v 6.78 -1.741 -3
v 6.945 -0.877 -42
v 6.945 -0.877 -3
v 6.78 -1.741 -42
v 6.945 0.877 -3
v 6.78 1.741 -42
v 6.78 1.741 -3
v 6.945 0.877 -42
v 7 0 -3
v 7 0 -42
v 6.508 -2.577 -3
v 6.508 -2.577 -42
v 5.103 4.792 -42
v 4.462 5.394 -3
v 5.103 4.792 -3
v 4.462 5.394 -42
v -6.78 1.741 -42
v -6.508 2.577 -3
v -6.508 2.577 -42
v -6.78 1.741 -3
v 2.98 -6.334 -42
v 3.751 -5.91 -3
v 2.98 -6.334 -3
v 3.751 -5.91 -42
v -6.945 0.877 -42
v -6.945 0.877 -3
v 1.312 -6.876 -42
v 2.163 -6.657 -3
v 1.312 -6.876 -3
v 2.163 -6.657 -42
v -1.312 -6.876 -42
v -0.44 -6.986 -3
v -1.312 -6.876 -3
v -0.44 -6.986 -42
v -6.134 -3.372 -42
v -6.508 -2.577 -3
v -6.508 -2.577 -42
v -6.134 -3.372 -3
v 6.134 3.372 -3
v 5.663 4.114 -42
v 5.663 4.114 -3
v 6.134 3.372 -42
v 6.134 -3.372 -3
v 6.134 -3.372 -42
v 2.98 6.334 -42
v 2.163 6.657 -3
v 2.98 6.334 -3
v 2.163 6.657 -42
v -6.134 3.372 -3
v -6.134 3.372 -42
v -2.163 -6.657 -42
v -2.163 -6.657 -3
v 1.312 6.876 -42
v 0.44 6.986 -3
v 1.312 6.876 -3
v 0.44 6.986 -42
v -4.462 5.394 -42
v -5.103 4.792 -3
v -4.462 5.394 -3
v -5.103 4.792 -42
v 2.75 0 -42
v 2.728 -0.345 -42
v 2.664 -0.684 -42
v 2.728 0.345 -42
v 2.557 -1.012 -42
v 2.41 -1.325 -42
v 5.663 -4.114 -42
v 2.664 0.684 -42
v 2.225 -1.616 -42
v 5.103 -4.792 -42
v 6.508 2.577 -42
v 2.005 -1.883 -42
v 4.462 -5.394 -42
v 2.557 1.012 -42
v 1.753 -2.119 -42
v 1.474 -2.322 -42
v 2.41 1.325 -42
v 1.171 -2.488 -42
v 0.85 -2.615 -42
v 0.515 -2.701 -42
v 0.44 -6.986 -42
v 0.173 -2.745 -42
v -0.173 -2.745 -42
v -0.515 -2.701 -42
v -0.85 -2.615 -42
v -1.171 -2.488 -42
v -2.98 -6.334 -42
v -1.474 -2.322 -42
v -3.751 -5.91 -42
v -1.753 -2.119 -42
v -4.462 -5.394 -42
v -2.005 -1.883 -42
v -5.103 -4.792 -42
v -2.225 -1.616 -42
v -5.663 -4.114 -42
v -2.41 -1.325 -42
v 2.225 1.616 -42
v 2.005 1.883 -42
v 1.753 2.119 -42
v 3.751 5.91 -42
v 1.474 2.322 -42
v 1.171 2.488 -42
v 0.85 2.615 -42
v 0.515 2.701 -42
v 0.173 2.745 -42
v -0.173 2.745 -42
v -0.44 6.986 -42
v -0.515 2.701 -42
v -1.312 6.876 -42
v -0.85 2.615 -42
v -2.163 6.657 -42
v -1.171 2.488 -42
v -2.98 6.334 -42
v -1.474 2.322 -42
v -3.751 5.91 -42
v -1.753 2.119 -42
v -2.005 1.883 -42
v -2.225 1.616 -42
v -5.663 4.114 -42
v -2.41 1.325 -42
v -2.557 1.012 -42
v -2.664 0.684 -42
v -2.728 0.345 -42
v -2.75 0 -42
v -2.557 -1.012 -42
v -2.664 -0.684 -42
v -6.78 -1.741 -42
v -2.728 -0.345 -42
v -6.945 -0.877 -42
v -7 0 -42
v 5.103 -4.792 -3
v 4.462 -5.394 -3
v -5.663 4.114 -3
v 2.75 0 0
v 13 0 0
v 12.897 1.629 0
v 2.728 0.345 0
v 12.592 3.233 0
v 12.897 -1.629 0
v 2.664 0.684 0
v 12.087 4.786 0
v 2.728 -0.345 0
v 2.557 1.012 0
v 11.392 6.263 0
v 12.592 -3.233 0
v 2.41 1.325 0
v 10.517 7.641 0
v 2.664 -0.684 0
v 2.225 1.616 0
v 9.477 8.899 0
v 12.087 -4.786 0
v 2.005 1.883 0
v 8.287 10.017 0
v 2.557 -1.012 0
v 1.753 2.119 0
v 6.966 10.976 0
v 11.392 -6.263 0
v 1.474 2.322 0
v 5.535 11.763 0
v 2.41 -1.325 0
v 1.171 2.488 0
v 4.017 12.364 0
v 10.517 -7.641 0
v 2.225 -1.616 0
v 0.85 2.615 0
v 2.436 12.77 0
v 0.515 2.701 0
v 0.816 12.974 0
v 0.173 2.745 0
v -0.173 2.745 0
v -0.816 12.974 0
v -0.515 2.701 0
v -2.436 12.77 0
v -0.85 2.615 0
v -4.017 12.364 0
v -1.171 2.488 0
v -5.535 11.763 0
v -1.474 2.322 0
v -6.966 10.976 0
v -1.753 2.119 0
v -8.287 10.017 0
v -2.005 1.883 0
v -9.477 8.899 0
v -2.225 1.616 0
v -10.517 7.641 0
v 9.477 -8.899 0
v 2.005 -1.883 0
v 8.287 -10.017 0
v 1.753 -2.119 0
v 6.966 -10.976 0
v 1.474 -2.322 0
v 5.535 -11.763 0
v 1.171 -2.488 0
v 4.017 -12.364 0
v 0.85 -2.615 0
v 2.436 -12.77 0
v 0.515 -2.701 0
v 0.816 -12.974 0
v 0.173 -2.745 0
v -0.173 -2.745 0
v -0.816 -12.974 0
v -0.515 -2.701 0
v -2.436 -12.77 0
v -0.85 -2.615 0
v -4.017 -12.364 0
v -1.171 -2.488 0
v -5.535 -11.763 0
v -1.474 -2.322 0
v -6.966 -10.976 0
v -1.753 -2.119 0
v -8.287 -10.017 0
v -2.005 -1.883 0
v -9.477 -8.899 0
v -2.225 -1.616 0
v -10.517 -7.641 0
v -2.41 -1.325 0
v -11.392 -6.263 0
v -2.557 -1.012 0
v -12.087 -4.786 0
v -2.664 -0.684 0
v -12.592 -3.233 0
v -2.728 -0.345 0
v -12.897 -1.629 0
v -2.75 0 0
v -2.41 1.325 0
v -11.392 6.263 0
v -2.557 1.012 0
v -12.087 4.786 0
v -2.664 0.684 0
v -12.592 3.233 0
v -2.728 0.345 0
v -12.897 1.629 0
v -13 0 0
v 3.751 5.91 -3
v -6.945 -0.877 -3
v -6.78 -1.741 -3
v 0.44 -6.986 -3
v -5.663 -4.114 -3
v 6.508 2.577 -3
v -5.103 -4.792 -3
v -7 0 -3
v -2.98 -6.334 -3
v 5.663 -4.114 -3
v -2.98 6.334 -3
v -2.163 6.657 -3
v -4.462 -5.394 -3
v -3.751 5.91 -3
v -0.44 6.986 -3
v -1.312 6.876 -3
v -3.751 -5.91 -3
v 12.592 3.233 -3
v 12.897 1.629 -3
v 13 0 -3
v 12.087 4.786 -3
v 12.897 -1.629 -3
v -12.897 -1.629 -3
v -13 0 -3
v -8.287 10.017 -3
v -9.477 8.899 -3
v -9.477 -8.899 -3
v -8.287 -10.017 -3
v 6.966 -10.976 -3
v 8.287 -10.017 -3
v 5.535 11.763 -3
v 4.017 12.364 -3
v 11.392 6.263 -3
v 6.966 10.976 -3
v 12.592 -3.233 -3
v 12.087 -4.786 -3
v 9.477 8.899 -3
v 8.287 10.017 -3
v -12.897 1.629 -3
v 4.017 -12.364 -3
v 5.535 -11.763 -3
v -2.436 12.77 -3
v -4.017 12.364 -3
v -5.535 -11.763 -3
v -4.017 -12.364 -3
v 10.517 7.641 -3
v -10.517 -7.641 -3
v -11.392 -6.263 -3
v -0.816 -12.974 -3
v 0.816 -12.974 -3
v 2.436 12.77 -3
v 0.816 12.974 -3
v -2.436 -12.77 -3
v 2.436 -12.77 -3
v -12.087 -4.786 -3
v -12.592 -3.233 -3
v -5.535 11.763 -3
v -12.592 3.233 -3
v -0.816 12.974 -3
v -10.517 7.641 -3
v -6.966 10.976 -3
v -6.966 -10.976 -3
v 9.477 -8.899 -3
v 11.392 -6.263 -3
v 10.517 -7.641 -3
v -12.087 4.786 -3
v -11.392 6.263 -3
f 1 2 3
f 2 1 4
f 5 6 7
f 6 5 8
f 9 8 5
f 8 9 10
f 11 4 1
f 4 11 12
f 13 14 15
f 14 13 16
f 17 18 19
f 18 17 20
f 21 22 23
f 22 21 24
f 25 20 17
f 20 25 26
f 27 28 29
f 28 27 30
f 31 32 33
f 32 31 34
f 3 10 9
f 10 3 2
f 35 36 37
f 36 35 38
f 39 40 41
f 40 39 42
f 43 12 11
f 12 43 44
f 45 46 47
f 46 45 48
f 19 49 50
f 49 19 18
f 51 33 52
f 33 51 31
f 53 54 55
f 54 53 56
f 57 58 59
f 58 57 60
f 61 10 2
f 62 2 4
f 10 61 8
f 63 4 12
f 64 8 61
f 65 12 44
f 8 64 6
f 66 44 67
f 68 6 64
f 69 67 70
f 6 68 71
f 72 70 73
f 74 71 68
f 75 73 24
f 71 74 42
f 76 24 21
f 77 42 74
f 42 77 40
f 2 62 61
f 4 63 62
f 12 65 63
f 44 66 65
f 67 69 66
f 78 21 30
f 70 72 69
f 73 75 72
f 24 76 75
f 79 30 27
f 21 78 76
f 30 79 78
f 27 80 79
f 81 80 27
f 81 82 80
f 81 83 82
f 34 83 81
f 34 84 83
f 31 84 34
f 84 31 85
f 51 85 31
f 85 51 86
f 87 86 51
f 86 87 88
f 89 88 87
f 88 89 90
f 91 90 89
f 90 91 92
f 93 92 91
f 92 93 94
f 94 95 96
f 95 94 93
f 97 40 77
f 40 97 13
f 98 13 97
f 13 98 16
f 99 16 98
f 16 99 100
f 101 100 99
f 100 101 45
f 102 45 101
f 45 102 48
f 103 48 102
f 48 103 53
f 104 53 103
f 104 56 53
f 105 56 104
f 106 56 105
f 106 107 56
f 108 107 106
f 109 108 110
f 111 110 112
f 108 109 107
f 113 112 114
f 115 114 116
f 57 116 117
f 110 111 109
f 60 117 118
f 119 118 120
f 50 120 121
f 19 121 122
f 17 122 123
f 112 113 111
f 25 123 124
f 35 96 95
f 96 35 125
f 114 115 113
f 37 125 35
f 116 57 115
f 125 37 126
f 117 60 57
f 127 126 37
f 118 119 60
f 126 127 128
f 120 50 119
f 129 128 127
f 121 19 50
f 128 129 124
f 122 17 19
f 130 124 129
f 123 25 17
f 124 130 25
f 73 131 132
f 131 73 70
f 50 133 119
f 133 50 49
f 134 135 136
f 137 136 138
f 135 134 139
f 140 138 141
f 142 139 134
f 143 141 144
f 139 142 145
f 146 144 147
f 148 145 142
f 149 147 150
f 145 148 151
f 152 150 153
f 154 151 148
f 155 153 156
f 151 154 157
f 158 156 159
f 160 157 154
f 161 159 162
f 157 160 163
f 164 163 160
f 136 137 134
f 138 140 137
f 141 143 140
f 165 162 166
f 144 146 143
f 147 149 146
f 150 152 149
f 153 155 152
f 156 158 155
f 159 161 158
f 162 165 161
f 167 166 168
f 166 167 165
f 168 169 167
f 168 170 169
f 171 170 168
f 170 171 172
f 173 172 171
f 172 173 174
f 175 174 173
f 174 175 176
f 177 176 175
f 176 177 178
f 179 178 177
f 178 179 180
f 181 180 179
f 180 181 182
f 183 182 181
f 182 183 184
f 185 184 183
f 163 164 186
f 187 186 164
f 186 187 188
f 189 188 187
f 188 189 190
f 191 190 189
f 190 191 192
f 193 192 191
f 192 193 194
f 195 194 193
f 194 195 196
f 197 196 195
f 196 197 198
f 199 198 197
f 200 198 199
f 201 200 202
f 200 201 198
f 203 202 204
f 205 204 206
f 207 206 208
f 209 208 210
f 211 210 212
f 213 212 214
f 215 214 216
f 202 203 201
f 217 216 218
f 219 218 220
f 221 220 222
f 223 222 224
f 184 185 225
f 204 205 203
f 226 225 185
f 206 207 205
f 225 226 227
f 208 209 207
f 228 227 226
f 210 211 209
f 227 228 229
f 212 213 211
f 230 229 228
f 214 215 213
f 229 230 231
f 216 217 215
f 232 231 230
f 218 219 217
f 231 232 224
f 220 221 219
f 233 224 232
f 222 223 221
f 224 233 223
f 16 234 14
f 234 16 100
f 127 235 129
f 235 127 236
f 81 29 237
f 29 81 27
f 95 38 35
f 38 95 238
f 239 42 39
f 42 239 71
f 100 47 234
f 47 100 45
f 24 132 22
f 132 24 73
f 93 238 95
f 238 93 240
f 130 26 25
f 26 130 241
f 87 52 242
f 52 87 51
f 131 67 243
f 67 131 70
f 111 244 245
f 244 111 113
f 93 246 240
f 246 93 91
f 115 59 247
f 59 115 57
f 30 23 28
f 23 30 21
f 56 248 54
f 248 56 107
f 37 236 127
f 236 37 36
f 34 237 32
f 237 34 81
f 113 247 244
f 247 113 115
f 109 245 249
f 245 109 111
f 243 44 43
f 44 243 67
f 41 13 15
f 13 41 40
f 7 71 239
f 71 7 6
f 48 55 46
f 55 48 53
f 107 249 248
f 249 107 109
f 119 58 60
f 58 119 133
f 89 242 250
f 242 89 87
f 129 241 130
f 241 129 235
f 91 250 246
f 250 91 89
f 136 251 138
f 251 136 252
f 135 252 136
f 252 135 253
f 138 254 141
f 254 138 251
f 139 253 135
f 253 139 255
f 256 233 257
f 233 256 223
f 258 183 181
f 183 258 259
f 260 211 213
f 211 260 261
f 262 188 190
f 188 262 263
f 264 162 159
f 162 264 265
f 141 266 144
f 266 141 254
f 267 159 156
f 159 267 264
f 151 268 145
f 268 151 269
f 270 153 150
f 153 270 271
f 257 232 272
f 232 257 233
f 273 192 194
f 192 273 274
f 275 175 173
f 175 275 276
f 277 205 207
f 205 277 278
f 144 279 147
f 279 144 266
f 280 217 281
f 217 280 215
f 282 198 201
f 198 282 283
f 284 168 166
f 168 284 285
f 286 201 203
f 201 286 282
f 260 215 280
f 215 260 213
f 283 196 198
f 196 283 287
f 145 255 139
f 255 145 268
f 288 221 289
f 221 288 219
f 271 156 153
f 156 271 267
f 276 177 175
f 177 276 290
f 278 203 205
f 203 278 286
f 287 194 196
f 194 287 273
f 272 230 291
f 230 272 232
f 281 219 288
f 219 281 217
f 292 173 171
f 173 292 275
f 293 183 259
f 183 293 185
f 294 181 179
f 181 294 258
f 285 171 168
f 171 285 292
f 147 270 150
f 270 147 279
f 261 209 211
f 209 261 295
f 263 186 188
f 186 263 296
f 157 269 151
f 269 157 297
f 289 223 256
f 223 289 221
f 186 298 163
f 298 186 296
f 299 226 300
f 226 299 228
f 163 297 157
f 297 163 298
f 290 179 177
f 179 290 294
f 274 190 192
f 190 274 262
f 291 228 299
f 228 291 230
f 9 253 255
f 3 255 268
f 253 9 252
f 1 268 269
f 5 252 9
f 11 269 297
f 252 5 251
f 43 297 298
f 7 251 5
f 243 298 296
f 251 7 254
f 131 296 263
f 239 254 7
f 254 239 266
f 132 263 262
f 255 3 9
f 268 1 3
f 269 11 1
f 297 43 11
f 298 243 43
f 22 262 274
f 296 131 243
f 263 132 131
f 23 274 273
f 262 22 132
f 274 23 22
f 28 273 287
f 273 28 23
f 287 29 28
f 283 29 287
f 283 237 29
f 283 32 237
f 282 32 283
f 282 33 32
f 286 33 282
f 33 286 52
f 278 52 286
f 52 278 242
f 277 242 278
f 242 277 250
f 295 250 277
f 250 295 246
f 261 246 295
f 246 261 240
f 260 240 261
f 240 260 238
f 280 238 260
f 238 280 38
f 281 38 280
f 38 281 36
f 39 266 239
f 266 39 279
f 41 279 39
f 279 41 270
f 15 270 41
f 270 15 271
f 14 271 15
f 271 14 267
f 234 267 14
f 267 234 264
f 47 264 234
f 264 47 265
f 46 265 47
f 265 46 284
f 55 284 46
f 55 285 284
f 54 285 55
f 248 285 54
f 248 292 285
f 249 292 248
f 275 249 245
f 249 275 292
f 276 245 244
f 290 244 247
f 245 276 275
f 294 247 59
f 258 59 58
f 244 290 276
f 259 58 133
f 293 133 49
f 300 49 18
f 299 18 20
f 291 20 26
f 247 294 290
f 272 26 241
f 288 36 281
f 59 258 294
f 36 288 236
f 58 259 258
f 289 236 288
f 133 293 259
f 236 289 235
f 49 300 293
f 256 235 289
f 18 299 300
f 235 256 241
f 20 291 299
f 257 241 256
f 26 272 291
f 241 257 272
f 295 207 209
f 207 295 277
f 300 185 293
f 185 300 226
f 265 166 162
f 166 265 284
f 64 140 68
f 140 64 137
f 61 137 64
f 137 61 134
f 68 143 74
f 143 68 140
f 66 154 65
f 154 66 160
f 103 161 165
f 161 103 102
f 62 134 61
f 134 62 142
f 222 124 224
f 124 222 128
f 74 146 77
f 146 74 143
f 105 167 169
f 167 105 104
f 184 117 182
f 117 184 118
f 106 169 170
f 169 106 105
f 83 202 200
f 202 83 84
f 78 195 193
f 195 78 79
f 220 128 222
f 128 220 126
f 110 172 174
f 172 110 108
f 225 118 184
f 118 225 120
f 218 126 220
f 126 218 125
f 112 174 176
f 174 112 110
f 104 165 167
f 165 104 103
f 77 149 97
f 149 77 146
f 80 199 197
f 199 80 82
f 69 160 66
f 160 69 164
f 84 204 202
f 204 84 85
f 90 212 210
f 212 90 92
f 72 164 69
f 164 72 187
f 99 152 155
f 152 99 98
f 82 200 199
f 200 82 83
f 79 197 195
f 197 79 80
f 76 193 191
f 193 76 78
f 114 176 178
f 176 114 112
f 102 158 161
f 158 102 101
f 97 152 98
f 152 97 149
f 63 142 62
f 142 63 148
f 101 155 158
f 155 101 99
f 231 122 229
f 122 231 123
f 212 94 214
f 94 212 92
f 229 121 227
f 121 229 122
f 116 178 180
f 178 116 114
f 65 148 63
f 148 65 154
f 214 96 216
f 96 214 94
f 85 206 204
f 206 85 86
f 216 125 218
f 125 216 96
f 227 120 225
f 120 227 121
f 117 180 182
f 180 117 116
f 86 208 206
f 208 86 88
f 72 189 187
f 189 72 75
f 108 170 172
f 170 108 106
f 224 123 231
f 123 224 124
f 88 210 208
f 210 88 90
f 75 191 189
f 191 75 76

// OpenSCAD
$fn = 50;


difference() {
	union() {
		translate(v = [0, 0, -42.0000000000]) {
			cylinder(h = 42, r = 7.0000000000);
		}
		translate(v = [0, 0, -3.0000000000]) {
			cylinder(h = 3, r = 13.0000000000);
		}
	}
	union() {
		#translate(v = [0, 0, -42]) {
			cylinder(h = 42, r = 2.7500000000);
		}
	}
}
